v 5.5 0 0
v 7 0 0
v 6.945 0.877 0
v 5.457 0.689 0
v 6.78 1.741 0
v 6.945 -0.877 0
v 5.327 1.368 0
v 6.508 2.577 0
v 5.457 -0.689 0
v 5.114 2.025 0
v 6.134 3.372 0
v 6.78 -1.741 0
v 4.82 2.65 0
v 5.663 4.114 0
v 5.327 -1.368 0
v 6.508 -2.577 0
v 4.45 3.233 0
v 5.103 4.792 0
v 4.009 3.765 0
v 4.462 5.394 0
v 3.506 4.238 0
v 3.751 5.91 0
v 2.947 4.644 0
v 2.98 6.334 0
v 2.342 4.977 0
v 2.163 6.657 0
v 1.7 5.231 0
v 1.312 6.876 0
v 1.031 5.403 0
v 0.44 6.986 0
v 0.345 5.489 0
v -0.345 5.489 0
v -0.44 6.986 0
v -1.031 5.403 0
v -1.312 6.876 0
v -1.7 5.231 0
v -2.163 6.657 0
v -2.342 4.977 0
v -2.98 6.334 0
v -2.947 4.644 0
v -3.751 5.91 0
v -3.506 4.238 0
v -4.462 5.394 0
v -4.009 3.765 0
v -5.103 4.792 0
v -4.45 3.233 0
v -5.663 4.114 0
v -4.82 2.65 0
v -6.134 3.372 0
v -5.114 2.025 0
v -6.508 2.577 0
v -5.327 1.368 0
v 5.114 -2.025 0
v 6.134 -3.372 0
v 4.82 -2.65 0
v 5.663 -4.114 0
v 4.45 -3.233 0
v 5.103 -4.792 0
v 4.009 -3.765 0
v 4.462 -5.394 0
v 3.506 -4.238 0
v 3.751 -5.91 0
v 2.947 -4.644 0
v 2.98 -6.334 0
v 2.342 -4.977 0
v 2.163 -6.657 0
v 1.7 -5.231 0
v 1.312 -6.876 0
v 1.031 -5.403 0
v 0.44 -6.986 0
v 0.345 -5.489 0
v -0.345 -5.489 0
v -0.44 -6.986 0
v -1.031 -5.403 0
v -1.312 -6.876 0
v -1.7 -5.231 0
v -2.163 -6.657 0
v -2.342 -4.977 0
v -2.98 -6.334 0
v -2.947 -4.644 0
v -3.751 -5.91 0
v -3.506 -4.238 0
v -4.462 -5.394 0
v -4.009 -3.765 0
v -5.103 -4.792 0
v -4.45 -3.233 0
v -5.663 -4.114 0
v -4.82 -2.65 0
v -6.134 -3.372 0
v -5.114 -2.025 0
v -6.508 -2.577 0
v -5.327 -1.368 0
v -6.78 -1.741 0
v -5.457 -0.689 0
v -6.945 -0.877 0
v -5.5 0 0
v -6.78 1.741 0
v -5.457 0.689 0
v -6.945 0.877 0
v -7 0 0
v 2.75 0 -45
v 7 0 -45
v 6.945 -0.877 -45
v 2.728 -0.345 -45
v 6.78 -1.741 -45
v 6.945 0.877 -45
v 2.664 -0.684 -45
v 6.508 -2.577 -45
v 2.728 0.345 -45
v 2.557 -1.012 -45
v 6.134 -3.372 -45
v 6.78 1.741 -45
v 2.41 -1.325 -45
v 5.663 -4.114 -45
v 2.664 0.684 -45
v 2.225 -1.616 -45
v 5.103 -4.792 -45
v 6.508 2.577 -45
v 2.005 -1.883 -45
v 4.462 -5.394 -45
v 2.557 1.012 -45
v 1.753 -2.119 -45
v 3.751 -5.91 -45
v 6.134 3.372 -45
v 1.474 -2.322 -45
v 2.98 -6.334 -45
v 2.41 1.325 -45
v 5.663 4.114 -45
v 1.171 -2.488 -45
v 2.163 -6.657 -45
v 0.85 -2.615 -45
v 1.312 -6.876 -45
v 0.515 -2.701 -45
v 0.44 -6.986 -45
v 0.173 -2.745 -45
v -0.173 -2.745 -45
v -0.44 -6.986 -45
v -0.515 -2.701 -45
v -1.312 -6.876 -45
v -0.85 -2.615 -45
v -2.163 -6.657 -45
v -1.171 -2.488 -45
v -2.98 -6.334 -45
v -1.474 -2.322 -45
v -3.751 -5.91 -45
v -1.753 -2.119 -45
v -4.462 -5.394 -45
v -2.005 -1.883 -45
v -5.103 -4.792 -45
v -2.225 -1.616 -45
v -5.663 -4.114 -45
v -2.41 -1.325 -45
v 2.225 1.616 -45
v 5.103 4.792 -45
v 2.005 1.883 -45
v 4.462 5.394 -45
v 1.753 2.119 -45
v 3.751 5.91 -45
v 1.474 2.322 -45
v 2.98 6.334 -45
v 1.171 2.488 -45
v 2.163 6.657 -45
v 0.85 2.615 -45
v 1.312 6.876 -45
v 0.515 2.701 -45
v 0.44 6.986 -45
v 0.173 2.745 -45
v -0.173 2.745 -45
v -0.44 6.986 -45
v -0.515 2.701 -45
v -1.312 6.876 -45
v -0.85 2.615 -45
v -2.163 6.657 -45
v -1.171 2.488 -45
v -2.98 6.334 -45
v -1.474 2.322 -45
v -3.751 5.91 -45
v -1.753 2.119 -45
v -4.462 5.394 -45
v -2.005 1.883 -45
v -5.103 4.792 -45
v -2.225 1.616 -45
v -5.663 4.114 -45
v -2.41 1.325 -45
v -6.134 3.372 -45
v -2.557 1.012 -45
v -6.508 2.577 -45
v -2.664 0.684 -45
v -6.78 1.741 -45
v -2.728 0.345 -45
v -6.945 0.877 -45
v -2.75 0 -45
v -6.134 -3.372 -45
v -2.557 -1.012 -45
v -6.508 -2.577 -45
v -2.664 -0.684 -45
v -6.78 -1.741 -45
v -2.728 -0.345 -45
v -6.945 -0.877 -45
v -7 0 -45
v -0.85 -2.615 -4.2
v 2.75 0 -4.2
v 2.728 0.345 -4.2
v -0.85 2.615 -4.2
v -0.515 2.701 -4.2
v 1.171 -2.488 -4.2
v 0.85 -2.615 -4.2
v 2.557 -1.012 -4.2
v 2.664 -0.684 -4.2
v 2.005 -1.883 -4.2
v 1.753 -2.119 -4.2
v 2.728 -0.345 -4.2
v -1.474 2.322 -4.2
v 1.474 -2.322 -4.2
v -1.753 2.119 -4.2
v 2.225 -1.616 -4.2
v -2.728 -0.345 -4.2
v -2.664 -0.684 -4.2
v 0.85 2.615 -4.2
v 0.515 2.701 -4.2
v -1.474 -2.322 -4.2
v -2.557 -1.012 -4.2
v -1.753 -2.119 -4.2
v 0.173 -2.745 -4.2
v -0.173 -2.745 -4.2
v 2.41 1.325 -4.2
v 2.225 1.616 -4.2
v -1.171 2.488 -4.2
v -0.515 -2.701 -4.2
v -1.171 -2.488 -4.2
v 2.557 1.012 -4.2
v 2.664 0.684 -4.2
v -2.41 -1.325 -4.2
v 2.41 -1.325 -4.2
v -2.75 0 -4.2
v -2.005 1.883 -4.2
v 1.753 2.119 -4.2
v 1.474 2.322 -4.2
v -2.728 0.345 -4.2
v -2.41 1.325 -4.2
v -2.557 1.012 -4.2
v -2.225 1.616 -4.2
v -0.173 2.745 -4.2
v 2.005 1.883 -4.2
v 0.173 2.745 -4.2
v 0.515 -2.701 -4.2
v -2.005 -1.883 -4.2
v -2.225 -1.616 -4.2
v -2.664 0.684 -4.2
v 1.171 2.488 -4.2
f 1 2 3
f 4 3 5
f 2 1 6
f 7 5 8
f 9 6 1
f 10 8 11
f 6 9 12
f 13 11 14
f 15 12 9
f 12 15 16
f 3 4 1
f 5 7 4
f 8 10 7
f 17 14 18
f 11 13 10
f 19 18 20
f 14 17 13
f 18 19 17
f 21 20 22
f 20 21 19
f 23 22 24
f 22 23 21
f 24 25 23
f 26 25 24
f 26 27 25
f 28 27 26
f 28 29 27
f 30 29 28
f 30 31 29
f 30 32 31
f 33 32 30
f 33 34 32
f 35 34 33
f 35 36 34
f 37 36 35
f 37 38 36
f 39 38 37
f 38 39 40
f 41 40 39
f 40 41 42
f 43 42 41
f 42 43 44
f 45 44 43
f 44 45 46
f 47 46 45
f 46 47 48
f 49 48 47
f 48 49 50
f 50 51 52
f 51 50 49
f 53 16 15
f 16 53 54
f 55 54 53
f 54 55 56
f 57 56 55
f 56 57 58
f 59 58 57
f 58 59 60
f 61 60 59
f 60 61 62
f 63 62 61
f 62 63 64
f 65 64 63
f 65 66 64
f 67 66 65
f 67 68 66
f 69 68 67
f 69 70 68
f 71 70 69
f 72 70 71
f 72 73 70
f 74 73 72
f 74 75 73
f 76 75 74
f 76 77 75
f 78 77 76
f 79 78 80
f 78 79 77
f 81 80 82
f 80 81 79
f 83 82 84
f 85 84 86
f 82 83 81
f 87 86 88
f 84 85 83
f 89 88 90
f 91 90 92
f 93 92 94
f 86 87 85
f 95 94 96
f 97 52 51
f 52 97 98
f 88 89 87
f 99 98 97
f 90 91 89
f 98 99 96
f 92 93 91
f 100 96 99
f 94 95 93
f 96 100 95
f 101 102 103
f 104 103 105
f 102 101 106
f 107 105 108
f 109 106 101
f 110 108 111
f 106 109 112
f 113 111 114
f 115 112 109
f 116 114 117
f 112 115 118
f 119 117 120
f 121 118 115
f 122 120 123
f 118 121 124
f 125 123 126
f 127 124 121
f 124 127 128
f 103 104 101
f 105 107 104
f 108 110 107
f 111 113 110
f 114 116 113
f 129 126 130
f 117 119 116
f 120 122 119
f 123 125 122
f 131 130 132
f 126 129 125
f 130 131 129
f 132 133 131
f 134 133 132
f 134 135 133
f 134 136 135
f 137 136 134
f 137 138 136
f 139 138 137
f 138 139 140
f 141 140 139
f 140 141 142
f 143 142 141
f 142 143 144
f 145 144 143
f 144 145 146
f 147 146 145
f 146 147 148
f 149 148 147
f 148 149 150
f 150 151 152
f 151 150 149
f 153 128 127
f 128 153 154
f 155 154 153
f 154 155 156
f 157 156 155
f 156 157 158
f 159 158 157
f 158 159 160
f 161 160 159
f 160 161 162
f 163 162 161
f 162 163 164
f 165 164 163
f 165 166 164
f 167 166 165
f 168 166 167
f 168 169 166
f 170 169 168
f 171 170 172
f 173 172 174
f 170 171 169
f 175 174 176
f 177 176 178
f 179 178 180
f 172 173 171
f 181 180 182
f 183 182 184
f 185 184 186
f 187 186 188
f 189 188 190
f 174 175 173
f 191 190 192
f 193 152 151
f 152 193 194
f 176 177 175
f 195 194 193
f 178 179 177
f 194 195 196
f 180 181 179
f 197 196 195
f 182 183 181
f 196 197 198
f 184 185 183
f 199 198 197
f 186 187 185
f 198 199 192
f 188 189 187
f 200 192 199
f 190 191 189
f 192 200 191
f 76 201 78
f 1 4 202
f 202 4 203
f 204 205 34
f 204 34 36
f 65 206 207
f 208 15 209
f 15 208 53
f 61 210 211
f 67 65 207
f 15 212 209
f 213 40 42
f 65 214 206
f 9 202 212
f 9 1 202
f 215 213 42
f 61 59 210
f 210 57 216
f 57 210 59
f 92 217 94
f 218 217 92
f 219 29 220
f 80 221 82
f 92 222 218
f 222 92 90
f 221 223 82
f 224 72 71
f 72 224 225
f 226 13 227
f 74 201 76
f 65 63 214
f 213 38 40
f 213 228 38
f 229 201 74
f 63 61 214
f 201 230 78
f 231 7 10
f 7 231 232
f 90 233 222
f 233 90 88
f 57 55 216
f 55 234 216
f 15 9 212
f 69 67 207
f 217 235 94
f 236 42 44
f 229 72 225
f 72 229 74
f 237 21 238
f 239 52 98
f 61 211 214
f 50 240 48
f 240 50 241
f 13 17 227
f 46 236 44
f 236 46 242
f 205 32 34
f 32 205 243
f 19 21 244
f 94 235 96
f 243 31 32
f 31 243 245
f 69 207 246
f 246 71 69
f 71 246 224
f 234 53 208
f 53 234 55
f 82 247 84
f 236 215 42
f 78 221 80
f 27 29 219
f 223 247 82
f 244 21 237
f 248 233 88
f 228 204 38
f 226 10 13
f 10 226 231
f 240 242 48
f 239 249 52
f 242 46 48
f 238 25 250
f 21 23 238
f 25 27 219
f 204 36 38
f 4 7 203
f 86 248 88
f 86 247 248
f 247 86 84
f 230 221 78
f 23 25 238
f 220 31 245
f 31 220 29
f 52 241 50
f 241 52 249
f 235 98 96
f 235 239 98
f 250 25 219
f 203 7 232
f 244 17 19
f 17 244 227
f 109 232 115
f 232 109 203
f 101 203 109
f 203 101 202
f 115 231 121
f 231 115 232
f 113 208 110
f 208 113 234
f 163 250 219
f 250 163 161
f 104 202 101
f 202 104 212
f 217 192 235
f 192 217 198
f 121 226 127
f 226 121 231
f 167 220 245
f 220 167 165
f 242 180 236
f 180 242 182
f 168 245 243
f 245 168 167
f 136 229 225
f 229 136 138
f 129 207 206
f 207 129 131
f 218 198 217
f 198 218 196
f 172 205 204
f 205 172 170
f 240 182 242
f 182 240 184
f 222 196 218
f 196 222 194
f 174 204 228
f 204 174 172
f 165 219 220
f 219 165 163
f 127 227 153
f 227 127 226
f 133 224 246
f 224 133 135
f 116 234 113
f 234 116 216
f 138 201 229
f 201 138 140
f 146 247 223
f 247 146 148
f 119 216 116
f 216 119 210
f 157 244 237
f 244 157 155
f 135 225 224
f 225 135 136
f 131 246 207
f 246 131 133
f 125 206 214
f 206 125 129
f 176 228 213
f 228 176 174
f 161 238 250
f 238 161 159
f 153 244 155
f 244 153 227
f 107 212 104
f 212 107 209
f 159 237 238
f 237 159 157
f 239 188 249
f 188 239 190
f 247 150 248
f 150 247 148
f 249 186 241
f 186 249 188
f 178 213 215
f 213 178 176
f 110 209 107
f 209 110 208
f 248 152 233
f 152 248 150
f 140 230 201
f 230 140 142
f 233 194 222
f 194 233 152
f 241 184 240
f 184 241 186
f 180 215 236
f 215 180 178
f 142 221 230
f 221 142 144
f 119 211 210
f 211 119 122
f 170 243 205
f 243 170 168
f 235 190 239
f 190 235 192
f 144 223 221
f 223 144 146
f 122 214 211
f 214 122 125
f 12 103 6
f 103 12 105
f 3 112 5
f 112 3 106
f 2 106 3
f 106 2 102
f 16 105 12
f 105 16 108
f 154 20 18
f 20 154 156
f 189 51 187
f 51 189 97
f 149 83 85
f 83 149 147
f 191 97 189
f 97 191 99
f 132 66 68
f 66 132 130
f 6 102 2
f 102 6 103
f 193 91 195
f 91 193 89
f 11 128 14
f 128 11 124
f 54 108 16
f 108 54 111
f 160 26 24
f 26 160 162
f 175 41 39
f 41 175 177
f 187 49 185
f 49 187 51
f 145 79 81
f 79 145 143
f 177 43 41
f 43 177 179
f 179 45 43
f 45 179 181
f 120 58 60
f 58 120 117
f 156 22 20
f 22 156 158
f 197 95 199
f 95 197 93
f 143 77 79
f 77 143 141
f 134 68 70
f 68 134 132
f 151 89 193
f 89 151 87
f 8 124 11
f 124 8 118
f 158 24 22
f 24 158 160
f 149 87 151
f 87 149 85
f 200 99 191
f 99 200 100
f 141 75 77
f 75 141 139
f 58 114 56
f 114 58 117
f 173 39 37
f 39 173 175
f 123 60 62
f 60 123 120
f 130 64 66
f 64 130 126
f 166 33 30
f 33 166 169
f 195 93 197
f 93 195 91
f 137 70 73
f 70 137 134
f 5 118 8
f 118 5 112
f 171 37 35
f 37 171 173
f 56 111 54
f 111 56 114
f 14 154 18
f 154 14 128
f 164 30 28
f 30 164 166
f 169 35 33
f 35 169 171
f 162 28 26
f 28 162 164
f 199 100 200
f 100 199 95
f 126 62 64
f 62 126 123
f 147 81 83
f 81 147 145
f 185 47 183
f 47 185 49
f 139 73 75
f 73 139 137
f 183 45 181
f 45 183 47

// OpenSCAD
$fn = 50;


difference() {
	union() {
		translate(v = [0, 0, -45.0000000000]) {
			cylinder(h = 45, r = 7.0000000000);
		}
		cylinder(h = 0, r = 10.0000000000);
	}
	union() {
		translate(v = [0, 0, 0]) {
			rotate(a = [0, 0, 0]) {
				difference() {
					union() {
						#translate(v = [0, 0, -45.0000000000]) {
							cylinder(h = 45, r = 2.2500000000);
						}
						#translate(v = [0, 0, -4.2000000000]) {
							cylinder(h = 4.2000000000, r = 7.0000000000, r1 = 2.7500000000, r2 = 5.5000000000);
						}
						#translate(v = [0, 0, -45.0000000000]) {
							cylinder(h = 45, r = 2.7500000000);
						}
						#translate(v = [0, 0, -45.0000000000]) {
							cylinder(h = 45, r = 2.2500000000);
						}
					}
					union();
				}
			}
		}
	}
}
